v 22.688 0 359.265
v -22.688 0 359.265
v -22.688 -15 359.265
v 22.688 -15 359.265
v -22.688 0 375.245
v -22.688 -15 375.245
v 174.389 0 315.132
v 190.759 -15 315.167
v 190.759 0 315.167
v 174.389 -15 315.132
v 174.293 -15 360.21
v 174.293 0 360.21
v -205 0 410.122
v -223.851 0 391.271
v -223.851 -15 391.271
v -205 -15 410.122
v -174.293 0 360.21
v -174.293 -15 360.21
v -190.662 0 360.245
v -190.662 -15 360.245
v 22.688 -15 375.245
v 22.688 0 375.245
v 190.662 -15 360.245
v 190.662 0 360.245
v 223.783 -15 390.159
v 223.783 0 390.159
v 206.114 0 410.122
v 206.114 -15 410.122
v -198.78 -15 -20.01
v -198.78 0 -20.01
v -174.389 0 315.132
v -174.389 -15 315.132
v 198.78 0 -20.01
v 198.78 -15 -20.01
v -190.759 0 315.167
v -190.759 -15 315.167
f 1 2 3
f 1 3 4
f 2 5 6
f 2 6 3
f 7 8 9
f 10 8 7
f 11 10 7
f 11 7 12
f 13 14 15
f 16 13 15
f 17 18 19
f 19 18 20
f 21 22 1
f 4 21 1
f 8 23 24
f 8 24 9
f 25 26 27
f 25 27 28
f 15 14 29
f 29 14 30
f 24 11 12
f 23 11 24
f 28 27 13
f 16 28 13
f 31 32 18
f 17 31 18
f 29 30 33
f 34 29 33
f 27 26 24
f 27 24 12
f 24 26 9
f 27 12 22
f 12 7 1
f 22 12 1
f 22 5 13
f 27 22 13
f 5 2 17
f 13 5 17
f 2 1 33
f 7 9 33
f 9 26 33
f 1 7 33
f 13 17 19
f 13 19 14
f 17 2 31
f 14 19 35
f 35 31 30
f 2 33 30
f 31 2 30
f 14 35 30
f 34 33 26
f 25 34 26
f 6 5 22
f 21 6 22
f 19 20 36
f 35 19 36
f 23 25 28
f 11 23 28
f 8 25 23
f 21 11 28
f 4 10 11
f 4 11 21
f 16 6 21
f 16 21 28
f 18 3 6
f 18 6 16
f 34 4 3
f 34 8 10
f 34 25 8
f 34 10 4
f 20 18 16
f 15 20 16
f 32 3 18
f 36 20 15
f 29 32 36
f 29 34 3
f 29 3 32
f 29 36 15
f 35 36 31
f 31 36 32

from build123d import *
from OCP.BRepFilletAPI import BRepFilletAPI_MakeChamfer

# Parameters (mm, degrees)
BOSS_EXTRUDE1_DEPTH = 15
CUT_EXTRUDE1_DEPTH  = 469.027776953
CHAMFER1_SIZE       = 20
CHAMFER1_SIZE2      = 18.885887556
SKETCH4_W           = 45.375817112
SKETCH4_H           = 15.979474245
CUT_EXTRUDE5_DEPTH  = 468.476442192


with BuildPart() as part:
    # Sketch1 → Boss-Extrude1 (new body)
    with BuildSketch(Plane(origin=(0, 0, 0), x_dir=(1, 0, 0), z_dir=(0, 1, 0))):
        Polygon((-225, -410.121933088), (-198.780229192, 20.01019046), (198.780229192, 20.01019046), (225, -410.121933088), align=None)
    extrude(amount=-BOSS_EXTRUDE1_DEPTH)

    # Sketch2 → Cut-Extrude1 (cut, through all)
    with BuildSketch(Plane.XZ.offset(15)):
        Polygon((190.662364216, 360.244932401), (190.758526229, 315.166919875), (174.389363372, 315.132000597), (174.293201359, 360.210013123), align=None)
    cut_extrude1 = extrude(amount=-CUT_EXTRUDE1_DEPTH, mode=Mode.SUBTRACT)

    # Mirror1: Cut-Extrude1 across plane
    add(cut_extrude1.mirror(Plane(origin=(0, 0, 0), x_dir=(0, 0, 1), z_dir=(1, 0, 0))), mode=Mode.SUBTRACT)

    # Chamfer1: one chamfer whose edges measure the first distance from different faces: ONE call of the kernel's chamfer builder (chamfer() names one face for all edges)
    chamfer1_edges_1 = [part.edges().sort_by_distance(p)[0] for p in [
        (-225, -7.5, 410.121933088),
    ]]
    chamfer1_side_1 = [part.faces().sort_by_distance(p)[0] for p in [
        (0, -7.5, 410.121933088),
    ]]
    chamfer1_edges_2 = [part.edges().sort_by_distance(p)[0] for p in [
        (225, -7.5, 410.121933088),
    ]]
    chamfer1_side_2 = [part.faces().sort_by_distance(p)[0] for p in [
        (211.890114596, -7.5, 195.055871314),
    ]]
    chamfer1 = BRepFilletAPI_MakeChamfer(part.part.solid().wrapped)
    for e in chamfer1_edges_1:
        chamfer1.Add(CHAMFER1_SIZE, CHAMFER1_SIZE2, e.wrapped, chamfer1_side_1[0].wrapped)  # the first distance lies on this face
    for e in chamfer1_edges_2:
        chamfer1.Add(CHAMFER1_SIZE, CHAMFER1_SIZE2, e.wrapped, chamfer1_side_2[0].wrapped)  # the first distance lies on this face
    add(Compound.cast(chamfer1.Shape()), mode=Mode.REPLACE)

    # Sketch4 → Cut-Extrude5 (cut, through all)
    with BuildSketch(Plane(origin=(0, 0, 0), x_dir=(1, 0, 0), z_dir=(0, 1, 0))):
        with Locations((0, -367.255161149)):
            Rectangle(SKETCH4_W, SKETCH4_H)
    extrude(amount=-CUT_EXTRUDE5_DEPTH, mode=Mode.SUBTRACT)


solid = part.part
